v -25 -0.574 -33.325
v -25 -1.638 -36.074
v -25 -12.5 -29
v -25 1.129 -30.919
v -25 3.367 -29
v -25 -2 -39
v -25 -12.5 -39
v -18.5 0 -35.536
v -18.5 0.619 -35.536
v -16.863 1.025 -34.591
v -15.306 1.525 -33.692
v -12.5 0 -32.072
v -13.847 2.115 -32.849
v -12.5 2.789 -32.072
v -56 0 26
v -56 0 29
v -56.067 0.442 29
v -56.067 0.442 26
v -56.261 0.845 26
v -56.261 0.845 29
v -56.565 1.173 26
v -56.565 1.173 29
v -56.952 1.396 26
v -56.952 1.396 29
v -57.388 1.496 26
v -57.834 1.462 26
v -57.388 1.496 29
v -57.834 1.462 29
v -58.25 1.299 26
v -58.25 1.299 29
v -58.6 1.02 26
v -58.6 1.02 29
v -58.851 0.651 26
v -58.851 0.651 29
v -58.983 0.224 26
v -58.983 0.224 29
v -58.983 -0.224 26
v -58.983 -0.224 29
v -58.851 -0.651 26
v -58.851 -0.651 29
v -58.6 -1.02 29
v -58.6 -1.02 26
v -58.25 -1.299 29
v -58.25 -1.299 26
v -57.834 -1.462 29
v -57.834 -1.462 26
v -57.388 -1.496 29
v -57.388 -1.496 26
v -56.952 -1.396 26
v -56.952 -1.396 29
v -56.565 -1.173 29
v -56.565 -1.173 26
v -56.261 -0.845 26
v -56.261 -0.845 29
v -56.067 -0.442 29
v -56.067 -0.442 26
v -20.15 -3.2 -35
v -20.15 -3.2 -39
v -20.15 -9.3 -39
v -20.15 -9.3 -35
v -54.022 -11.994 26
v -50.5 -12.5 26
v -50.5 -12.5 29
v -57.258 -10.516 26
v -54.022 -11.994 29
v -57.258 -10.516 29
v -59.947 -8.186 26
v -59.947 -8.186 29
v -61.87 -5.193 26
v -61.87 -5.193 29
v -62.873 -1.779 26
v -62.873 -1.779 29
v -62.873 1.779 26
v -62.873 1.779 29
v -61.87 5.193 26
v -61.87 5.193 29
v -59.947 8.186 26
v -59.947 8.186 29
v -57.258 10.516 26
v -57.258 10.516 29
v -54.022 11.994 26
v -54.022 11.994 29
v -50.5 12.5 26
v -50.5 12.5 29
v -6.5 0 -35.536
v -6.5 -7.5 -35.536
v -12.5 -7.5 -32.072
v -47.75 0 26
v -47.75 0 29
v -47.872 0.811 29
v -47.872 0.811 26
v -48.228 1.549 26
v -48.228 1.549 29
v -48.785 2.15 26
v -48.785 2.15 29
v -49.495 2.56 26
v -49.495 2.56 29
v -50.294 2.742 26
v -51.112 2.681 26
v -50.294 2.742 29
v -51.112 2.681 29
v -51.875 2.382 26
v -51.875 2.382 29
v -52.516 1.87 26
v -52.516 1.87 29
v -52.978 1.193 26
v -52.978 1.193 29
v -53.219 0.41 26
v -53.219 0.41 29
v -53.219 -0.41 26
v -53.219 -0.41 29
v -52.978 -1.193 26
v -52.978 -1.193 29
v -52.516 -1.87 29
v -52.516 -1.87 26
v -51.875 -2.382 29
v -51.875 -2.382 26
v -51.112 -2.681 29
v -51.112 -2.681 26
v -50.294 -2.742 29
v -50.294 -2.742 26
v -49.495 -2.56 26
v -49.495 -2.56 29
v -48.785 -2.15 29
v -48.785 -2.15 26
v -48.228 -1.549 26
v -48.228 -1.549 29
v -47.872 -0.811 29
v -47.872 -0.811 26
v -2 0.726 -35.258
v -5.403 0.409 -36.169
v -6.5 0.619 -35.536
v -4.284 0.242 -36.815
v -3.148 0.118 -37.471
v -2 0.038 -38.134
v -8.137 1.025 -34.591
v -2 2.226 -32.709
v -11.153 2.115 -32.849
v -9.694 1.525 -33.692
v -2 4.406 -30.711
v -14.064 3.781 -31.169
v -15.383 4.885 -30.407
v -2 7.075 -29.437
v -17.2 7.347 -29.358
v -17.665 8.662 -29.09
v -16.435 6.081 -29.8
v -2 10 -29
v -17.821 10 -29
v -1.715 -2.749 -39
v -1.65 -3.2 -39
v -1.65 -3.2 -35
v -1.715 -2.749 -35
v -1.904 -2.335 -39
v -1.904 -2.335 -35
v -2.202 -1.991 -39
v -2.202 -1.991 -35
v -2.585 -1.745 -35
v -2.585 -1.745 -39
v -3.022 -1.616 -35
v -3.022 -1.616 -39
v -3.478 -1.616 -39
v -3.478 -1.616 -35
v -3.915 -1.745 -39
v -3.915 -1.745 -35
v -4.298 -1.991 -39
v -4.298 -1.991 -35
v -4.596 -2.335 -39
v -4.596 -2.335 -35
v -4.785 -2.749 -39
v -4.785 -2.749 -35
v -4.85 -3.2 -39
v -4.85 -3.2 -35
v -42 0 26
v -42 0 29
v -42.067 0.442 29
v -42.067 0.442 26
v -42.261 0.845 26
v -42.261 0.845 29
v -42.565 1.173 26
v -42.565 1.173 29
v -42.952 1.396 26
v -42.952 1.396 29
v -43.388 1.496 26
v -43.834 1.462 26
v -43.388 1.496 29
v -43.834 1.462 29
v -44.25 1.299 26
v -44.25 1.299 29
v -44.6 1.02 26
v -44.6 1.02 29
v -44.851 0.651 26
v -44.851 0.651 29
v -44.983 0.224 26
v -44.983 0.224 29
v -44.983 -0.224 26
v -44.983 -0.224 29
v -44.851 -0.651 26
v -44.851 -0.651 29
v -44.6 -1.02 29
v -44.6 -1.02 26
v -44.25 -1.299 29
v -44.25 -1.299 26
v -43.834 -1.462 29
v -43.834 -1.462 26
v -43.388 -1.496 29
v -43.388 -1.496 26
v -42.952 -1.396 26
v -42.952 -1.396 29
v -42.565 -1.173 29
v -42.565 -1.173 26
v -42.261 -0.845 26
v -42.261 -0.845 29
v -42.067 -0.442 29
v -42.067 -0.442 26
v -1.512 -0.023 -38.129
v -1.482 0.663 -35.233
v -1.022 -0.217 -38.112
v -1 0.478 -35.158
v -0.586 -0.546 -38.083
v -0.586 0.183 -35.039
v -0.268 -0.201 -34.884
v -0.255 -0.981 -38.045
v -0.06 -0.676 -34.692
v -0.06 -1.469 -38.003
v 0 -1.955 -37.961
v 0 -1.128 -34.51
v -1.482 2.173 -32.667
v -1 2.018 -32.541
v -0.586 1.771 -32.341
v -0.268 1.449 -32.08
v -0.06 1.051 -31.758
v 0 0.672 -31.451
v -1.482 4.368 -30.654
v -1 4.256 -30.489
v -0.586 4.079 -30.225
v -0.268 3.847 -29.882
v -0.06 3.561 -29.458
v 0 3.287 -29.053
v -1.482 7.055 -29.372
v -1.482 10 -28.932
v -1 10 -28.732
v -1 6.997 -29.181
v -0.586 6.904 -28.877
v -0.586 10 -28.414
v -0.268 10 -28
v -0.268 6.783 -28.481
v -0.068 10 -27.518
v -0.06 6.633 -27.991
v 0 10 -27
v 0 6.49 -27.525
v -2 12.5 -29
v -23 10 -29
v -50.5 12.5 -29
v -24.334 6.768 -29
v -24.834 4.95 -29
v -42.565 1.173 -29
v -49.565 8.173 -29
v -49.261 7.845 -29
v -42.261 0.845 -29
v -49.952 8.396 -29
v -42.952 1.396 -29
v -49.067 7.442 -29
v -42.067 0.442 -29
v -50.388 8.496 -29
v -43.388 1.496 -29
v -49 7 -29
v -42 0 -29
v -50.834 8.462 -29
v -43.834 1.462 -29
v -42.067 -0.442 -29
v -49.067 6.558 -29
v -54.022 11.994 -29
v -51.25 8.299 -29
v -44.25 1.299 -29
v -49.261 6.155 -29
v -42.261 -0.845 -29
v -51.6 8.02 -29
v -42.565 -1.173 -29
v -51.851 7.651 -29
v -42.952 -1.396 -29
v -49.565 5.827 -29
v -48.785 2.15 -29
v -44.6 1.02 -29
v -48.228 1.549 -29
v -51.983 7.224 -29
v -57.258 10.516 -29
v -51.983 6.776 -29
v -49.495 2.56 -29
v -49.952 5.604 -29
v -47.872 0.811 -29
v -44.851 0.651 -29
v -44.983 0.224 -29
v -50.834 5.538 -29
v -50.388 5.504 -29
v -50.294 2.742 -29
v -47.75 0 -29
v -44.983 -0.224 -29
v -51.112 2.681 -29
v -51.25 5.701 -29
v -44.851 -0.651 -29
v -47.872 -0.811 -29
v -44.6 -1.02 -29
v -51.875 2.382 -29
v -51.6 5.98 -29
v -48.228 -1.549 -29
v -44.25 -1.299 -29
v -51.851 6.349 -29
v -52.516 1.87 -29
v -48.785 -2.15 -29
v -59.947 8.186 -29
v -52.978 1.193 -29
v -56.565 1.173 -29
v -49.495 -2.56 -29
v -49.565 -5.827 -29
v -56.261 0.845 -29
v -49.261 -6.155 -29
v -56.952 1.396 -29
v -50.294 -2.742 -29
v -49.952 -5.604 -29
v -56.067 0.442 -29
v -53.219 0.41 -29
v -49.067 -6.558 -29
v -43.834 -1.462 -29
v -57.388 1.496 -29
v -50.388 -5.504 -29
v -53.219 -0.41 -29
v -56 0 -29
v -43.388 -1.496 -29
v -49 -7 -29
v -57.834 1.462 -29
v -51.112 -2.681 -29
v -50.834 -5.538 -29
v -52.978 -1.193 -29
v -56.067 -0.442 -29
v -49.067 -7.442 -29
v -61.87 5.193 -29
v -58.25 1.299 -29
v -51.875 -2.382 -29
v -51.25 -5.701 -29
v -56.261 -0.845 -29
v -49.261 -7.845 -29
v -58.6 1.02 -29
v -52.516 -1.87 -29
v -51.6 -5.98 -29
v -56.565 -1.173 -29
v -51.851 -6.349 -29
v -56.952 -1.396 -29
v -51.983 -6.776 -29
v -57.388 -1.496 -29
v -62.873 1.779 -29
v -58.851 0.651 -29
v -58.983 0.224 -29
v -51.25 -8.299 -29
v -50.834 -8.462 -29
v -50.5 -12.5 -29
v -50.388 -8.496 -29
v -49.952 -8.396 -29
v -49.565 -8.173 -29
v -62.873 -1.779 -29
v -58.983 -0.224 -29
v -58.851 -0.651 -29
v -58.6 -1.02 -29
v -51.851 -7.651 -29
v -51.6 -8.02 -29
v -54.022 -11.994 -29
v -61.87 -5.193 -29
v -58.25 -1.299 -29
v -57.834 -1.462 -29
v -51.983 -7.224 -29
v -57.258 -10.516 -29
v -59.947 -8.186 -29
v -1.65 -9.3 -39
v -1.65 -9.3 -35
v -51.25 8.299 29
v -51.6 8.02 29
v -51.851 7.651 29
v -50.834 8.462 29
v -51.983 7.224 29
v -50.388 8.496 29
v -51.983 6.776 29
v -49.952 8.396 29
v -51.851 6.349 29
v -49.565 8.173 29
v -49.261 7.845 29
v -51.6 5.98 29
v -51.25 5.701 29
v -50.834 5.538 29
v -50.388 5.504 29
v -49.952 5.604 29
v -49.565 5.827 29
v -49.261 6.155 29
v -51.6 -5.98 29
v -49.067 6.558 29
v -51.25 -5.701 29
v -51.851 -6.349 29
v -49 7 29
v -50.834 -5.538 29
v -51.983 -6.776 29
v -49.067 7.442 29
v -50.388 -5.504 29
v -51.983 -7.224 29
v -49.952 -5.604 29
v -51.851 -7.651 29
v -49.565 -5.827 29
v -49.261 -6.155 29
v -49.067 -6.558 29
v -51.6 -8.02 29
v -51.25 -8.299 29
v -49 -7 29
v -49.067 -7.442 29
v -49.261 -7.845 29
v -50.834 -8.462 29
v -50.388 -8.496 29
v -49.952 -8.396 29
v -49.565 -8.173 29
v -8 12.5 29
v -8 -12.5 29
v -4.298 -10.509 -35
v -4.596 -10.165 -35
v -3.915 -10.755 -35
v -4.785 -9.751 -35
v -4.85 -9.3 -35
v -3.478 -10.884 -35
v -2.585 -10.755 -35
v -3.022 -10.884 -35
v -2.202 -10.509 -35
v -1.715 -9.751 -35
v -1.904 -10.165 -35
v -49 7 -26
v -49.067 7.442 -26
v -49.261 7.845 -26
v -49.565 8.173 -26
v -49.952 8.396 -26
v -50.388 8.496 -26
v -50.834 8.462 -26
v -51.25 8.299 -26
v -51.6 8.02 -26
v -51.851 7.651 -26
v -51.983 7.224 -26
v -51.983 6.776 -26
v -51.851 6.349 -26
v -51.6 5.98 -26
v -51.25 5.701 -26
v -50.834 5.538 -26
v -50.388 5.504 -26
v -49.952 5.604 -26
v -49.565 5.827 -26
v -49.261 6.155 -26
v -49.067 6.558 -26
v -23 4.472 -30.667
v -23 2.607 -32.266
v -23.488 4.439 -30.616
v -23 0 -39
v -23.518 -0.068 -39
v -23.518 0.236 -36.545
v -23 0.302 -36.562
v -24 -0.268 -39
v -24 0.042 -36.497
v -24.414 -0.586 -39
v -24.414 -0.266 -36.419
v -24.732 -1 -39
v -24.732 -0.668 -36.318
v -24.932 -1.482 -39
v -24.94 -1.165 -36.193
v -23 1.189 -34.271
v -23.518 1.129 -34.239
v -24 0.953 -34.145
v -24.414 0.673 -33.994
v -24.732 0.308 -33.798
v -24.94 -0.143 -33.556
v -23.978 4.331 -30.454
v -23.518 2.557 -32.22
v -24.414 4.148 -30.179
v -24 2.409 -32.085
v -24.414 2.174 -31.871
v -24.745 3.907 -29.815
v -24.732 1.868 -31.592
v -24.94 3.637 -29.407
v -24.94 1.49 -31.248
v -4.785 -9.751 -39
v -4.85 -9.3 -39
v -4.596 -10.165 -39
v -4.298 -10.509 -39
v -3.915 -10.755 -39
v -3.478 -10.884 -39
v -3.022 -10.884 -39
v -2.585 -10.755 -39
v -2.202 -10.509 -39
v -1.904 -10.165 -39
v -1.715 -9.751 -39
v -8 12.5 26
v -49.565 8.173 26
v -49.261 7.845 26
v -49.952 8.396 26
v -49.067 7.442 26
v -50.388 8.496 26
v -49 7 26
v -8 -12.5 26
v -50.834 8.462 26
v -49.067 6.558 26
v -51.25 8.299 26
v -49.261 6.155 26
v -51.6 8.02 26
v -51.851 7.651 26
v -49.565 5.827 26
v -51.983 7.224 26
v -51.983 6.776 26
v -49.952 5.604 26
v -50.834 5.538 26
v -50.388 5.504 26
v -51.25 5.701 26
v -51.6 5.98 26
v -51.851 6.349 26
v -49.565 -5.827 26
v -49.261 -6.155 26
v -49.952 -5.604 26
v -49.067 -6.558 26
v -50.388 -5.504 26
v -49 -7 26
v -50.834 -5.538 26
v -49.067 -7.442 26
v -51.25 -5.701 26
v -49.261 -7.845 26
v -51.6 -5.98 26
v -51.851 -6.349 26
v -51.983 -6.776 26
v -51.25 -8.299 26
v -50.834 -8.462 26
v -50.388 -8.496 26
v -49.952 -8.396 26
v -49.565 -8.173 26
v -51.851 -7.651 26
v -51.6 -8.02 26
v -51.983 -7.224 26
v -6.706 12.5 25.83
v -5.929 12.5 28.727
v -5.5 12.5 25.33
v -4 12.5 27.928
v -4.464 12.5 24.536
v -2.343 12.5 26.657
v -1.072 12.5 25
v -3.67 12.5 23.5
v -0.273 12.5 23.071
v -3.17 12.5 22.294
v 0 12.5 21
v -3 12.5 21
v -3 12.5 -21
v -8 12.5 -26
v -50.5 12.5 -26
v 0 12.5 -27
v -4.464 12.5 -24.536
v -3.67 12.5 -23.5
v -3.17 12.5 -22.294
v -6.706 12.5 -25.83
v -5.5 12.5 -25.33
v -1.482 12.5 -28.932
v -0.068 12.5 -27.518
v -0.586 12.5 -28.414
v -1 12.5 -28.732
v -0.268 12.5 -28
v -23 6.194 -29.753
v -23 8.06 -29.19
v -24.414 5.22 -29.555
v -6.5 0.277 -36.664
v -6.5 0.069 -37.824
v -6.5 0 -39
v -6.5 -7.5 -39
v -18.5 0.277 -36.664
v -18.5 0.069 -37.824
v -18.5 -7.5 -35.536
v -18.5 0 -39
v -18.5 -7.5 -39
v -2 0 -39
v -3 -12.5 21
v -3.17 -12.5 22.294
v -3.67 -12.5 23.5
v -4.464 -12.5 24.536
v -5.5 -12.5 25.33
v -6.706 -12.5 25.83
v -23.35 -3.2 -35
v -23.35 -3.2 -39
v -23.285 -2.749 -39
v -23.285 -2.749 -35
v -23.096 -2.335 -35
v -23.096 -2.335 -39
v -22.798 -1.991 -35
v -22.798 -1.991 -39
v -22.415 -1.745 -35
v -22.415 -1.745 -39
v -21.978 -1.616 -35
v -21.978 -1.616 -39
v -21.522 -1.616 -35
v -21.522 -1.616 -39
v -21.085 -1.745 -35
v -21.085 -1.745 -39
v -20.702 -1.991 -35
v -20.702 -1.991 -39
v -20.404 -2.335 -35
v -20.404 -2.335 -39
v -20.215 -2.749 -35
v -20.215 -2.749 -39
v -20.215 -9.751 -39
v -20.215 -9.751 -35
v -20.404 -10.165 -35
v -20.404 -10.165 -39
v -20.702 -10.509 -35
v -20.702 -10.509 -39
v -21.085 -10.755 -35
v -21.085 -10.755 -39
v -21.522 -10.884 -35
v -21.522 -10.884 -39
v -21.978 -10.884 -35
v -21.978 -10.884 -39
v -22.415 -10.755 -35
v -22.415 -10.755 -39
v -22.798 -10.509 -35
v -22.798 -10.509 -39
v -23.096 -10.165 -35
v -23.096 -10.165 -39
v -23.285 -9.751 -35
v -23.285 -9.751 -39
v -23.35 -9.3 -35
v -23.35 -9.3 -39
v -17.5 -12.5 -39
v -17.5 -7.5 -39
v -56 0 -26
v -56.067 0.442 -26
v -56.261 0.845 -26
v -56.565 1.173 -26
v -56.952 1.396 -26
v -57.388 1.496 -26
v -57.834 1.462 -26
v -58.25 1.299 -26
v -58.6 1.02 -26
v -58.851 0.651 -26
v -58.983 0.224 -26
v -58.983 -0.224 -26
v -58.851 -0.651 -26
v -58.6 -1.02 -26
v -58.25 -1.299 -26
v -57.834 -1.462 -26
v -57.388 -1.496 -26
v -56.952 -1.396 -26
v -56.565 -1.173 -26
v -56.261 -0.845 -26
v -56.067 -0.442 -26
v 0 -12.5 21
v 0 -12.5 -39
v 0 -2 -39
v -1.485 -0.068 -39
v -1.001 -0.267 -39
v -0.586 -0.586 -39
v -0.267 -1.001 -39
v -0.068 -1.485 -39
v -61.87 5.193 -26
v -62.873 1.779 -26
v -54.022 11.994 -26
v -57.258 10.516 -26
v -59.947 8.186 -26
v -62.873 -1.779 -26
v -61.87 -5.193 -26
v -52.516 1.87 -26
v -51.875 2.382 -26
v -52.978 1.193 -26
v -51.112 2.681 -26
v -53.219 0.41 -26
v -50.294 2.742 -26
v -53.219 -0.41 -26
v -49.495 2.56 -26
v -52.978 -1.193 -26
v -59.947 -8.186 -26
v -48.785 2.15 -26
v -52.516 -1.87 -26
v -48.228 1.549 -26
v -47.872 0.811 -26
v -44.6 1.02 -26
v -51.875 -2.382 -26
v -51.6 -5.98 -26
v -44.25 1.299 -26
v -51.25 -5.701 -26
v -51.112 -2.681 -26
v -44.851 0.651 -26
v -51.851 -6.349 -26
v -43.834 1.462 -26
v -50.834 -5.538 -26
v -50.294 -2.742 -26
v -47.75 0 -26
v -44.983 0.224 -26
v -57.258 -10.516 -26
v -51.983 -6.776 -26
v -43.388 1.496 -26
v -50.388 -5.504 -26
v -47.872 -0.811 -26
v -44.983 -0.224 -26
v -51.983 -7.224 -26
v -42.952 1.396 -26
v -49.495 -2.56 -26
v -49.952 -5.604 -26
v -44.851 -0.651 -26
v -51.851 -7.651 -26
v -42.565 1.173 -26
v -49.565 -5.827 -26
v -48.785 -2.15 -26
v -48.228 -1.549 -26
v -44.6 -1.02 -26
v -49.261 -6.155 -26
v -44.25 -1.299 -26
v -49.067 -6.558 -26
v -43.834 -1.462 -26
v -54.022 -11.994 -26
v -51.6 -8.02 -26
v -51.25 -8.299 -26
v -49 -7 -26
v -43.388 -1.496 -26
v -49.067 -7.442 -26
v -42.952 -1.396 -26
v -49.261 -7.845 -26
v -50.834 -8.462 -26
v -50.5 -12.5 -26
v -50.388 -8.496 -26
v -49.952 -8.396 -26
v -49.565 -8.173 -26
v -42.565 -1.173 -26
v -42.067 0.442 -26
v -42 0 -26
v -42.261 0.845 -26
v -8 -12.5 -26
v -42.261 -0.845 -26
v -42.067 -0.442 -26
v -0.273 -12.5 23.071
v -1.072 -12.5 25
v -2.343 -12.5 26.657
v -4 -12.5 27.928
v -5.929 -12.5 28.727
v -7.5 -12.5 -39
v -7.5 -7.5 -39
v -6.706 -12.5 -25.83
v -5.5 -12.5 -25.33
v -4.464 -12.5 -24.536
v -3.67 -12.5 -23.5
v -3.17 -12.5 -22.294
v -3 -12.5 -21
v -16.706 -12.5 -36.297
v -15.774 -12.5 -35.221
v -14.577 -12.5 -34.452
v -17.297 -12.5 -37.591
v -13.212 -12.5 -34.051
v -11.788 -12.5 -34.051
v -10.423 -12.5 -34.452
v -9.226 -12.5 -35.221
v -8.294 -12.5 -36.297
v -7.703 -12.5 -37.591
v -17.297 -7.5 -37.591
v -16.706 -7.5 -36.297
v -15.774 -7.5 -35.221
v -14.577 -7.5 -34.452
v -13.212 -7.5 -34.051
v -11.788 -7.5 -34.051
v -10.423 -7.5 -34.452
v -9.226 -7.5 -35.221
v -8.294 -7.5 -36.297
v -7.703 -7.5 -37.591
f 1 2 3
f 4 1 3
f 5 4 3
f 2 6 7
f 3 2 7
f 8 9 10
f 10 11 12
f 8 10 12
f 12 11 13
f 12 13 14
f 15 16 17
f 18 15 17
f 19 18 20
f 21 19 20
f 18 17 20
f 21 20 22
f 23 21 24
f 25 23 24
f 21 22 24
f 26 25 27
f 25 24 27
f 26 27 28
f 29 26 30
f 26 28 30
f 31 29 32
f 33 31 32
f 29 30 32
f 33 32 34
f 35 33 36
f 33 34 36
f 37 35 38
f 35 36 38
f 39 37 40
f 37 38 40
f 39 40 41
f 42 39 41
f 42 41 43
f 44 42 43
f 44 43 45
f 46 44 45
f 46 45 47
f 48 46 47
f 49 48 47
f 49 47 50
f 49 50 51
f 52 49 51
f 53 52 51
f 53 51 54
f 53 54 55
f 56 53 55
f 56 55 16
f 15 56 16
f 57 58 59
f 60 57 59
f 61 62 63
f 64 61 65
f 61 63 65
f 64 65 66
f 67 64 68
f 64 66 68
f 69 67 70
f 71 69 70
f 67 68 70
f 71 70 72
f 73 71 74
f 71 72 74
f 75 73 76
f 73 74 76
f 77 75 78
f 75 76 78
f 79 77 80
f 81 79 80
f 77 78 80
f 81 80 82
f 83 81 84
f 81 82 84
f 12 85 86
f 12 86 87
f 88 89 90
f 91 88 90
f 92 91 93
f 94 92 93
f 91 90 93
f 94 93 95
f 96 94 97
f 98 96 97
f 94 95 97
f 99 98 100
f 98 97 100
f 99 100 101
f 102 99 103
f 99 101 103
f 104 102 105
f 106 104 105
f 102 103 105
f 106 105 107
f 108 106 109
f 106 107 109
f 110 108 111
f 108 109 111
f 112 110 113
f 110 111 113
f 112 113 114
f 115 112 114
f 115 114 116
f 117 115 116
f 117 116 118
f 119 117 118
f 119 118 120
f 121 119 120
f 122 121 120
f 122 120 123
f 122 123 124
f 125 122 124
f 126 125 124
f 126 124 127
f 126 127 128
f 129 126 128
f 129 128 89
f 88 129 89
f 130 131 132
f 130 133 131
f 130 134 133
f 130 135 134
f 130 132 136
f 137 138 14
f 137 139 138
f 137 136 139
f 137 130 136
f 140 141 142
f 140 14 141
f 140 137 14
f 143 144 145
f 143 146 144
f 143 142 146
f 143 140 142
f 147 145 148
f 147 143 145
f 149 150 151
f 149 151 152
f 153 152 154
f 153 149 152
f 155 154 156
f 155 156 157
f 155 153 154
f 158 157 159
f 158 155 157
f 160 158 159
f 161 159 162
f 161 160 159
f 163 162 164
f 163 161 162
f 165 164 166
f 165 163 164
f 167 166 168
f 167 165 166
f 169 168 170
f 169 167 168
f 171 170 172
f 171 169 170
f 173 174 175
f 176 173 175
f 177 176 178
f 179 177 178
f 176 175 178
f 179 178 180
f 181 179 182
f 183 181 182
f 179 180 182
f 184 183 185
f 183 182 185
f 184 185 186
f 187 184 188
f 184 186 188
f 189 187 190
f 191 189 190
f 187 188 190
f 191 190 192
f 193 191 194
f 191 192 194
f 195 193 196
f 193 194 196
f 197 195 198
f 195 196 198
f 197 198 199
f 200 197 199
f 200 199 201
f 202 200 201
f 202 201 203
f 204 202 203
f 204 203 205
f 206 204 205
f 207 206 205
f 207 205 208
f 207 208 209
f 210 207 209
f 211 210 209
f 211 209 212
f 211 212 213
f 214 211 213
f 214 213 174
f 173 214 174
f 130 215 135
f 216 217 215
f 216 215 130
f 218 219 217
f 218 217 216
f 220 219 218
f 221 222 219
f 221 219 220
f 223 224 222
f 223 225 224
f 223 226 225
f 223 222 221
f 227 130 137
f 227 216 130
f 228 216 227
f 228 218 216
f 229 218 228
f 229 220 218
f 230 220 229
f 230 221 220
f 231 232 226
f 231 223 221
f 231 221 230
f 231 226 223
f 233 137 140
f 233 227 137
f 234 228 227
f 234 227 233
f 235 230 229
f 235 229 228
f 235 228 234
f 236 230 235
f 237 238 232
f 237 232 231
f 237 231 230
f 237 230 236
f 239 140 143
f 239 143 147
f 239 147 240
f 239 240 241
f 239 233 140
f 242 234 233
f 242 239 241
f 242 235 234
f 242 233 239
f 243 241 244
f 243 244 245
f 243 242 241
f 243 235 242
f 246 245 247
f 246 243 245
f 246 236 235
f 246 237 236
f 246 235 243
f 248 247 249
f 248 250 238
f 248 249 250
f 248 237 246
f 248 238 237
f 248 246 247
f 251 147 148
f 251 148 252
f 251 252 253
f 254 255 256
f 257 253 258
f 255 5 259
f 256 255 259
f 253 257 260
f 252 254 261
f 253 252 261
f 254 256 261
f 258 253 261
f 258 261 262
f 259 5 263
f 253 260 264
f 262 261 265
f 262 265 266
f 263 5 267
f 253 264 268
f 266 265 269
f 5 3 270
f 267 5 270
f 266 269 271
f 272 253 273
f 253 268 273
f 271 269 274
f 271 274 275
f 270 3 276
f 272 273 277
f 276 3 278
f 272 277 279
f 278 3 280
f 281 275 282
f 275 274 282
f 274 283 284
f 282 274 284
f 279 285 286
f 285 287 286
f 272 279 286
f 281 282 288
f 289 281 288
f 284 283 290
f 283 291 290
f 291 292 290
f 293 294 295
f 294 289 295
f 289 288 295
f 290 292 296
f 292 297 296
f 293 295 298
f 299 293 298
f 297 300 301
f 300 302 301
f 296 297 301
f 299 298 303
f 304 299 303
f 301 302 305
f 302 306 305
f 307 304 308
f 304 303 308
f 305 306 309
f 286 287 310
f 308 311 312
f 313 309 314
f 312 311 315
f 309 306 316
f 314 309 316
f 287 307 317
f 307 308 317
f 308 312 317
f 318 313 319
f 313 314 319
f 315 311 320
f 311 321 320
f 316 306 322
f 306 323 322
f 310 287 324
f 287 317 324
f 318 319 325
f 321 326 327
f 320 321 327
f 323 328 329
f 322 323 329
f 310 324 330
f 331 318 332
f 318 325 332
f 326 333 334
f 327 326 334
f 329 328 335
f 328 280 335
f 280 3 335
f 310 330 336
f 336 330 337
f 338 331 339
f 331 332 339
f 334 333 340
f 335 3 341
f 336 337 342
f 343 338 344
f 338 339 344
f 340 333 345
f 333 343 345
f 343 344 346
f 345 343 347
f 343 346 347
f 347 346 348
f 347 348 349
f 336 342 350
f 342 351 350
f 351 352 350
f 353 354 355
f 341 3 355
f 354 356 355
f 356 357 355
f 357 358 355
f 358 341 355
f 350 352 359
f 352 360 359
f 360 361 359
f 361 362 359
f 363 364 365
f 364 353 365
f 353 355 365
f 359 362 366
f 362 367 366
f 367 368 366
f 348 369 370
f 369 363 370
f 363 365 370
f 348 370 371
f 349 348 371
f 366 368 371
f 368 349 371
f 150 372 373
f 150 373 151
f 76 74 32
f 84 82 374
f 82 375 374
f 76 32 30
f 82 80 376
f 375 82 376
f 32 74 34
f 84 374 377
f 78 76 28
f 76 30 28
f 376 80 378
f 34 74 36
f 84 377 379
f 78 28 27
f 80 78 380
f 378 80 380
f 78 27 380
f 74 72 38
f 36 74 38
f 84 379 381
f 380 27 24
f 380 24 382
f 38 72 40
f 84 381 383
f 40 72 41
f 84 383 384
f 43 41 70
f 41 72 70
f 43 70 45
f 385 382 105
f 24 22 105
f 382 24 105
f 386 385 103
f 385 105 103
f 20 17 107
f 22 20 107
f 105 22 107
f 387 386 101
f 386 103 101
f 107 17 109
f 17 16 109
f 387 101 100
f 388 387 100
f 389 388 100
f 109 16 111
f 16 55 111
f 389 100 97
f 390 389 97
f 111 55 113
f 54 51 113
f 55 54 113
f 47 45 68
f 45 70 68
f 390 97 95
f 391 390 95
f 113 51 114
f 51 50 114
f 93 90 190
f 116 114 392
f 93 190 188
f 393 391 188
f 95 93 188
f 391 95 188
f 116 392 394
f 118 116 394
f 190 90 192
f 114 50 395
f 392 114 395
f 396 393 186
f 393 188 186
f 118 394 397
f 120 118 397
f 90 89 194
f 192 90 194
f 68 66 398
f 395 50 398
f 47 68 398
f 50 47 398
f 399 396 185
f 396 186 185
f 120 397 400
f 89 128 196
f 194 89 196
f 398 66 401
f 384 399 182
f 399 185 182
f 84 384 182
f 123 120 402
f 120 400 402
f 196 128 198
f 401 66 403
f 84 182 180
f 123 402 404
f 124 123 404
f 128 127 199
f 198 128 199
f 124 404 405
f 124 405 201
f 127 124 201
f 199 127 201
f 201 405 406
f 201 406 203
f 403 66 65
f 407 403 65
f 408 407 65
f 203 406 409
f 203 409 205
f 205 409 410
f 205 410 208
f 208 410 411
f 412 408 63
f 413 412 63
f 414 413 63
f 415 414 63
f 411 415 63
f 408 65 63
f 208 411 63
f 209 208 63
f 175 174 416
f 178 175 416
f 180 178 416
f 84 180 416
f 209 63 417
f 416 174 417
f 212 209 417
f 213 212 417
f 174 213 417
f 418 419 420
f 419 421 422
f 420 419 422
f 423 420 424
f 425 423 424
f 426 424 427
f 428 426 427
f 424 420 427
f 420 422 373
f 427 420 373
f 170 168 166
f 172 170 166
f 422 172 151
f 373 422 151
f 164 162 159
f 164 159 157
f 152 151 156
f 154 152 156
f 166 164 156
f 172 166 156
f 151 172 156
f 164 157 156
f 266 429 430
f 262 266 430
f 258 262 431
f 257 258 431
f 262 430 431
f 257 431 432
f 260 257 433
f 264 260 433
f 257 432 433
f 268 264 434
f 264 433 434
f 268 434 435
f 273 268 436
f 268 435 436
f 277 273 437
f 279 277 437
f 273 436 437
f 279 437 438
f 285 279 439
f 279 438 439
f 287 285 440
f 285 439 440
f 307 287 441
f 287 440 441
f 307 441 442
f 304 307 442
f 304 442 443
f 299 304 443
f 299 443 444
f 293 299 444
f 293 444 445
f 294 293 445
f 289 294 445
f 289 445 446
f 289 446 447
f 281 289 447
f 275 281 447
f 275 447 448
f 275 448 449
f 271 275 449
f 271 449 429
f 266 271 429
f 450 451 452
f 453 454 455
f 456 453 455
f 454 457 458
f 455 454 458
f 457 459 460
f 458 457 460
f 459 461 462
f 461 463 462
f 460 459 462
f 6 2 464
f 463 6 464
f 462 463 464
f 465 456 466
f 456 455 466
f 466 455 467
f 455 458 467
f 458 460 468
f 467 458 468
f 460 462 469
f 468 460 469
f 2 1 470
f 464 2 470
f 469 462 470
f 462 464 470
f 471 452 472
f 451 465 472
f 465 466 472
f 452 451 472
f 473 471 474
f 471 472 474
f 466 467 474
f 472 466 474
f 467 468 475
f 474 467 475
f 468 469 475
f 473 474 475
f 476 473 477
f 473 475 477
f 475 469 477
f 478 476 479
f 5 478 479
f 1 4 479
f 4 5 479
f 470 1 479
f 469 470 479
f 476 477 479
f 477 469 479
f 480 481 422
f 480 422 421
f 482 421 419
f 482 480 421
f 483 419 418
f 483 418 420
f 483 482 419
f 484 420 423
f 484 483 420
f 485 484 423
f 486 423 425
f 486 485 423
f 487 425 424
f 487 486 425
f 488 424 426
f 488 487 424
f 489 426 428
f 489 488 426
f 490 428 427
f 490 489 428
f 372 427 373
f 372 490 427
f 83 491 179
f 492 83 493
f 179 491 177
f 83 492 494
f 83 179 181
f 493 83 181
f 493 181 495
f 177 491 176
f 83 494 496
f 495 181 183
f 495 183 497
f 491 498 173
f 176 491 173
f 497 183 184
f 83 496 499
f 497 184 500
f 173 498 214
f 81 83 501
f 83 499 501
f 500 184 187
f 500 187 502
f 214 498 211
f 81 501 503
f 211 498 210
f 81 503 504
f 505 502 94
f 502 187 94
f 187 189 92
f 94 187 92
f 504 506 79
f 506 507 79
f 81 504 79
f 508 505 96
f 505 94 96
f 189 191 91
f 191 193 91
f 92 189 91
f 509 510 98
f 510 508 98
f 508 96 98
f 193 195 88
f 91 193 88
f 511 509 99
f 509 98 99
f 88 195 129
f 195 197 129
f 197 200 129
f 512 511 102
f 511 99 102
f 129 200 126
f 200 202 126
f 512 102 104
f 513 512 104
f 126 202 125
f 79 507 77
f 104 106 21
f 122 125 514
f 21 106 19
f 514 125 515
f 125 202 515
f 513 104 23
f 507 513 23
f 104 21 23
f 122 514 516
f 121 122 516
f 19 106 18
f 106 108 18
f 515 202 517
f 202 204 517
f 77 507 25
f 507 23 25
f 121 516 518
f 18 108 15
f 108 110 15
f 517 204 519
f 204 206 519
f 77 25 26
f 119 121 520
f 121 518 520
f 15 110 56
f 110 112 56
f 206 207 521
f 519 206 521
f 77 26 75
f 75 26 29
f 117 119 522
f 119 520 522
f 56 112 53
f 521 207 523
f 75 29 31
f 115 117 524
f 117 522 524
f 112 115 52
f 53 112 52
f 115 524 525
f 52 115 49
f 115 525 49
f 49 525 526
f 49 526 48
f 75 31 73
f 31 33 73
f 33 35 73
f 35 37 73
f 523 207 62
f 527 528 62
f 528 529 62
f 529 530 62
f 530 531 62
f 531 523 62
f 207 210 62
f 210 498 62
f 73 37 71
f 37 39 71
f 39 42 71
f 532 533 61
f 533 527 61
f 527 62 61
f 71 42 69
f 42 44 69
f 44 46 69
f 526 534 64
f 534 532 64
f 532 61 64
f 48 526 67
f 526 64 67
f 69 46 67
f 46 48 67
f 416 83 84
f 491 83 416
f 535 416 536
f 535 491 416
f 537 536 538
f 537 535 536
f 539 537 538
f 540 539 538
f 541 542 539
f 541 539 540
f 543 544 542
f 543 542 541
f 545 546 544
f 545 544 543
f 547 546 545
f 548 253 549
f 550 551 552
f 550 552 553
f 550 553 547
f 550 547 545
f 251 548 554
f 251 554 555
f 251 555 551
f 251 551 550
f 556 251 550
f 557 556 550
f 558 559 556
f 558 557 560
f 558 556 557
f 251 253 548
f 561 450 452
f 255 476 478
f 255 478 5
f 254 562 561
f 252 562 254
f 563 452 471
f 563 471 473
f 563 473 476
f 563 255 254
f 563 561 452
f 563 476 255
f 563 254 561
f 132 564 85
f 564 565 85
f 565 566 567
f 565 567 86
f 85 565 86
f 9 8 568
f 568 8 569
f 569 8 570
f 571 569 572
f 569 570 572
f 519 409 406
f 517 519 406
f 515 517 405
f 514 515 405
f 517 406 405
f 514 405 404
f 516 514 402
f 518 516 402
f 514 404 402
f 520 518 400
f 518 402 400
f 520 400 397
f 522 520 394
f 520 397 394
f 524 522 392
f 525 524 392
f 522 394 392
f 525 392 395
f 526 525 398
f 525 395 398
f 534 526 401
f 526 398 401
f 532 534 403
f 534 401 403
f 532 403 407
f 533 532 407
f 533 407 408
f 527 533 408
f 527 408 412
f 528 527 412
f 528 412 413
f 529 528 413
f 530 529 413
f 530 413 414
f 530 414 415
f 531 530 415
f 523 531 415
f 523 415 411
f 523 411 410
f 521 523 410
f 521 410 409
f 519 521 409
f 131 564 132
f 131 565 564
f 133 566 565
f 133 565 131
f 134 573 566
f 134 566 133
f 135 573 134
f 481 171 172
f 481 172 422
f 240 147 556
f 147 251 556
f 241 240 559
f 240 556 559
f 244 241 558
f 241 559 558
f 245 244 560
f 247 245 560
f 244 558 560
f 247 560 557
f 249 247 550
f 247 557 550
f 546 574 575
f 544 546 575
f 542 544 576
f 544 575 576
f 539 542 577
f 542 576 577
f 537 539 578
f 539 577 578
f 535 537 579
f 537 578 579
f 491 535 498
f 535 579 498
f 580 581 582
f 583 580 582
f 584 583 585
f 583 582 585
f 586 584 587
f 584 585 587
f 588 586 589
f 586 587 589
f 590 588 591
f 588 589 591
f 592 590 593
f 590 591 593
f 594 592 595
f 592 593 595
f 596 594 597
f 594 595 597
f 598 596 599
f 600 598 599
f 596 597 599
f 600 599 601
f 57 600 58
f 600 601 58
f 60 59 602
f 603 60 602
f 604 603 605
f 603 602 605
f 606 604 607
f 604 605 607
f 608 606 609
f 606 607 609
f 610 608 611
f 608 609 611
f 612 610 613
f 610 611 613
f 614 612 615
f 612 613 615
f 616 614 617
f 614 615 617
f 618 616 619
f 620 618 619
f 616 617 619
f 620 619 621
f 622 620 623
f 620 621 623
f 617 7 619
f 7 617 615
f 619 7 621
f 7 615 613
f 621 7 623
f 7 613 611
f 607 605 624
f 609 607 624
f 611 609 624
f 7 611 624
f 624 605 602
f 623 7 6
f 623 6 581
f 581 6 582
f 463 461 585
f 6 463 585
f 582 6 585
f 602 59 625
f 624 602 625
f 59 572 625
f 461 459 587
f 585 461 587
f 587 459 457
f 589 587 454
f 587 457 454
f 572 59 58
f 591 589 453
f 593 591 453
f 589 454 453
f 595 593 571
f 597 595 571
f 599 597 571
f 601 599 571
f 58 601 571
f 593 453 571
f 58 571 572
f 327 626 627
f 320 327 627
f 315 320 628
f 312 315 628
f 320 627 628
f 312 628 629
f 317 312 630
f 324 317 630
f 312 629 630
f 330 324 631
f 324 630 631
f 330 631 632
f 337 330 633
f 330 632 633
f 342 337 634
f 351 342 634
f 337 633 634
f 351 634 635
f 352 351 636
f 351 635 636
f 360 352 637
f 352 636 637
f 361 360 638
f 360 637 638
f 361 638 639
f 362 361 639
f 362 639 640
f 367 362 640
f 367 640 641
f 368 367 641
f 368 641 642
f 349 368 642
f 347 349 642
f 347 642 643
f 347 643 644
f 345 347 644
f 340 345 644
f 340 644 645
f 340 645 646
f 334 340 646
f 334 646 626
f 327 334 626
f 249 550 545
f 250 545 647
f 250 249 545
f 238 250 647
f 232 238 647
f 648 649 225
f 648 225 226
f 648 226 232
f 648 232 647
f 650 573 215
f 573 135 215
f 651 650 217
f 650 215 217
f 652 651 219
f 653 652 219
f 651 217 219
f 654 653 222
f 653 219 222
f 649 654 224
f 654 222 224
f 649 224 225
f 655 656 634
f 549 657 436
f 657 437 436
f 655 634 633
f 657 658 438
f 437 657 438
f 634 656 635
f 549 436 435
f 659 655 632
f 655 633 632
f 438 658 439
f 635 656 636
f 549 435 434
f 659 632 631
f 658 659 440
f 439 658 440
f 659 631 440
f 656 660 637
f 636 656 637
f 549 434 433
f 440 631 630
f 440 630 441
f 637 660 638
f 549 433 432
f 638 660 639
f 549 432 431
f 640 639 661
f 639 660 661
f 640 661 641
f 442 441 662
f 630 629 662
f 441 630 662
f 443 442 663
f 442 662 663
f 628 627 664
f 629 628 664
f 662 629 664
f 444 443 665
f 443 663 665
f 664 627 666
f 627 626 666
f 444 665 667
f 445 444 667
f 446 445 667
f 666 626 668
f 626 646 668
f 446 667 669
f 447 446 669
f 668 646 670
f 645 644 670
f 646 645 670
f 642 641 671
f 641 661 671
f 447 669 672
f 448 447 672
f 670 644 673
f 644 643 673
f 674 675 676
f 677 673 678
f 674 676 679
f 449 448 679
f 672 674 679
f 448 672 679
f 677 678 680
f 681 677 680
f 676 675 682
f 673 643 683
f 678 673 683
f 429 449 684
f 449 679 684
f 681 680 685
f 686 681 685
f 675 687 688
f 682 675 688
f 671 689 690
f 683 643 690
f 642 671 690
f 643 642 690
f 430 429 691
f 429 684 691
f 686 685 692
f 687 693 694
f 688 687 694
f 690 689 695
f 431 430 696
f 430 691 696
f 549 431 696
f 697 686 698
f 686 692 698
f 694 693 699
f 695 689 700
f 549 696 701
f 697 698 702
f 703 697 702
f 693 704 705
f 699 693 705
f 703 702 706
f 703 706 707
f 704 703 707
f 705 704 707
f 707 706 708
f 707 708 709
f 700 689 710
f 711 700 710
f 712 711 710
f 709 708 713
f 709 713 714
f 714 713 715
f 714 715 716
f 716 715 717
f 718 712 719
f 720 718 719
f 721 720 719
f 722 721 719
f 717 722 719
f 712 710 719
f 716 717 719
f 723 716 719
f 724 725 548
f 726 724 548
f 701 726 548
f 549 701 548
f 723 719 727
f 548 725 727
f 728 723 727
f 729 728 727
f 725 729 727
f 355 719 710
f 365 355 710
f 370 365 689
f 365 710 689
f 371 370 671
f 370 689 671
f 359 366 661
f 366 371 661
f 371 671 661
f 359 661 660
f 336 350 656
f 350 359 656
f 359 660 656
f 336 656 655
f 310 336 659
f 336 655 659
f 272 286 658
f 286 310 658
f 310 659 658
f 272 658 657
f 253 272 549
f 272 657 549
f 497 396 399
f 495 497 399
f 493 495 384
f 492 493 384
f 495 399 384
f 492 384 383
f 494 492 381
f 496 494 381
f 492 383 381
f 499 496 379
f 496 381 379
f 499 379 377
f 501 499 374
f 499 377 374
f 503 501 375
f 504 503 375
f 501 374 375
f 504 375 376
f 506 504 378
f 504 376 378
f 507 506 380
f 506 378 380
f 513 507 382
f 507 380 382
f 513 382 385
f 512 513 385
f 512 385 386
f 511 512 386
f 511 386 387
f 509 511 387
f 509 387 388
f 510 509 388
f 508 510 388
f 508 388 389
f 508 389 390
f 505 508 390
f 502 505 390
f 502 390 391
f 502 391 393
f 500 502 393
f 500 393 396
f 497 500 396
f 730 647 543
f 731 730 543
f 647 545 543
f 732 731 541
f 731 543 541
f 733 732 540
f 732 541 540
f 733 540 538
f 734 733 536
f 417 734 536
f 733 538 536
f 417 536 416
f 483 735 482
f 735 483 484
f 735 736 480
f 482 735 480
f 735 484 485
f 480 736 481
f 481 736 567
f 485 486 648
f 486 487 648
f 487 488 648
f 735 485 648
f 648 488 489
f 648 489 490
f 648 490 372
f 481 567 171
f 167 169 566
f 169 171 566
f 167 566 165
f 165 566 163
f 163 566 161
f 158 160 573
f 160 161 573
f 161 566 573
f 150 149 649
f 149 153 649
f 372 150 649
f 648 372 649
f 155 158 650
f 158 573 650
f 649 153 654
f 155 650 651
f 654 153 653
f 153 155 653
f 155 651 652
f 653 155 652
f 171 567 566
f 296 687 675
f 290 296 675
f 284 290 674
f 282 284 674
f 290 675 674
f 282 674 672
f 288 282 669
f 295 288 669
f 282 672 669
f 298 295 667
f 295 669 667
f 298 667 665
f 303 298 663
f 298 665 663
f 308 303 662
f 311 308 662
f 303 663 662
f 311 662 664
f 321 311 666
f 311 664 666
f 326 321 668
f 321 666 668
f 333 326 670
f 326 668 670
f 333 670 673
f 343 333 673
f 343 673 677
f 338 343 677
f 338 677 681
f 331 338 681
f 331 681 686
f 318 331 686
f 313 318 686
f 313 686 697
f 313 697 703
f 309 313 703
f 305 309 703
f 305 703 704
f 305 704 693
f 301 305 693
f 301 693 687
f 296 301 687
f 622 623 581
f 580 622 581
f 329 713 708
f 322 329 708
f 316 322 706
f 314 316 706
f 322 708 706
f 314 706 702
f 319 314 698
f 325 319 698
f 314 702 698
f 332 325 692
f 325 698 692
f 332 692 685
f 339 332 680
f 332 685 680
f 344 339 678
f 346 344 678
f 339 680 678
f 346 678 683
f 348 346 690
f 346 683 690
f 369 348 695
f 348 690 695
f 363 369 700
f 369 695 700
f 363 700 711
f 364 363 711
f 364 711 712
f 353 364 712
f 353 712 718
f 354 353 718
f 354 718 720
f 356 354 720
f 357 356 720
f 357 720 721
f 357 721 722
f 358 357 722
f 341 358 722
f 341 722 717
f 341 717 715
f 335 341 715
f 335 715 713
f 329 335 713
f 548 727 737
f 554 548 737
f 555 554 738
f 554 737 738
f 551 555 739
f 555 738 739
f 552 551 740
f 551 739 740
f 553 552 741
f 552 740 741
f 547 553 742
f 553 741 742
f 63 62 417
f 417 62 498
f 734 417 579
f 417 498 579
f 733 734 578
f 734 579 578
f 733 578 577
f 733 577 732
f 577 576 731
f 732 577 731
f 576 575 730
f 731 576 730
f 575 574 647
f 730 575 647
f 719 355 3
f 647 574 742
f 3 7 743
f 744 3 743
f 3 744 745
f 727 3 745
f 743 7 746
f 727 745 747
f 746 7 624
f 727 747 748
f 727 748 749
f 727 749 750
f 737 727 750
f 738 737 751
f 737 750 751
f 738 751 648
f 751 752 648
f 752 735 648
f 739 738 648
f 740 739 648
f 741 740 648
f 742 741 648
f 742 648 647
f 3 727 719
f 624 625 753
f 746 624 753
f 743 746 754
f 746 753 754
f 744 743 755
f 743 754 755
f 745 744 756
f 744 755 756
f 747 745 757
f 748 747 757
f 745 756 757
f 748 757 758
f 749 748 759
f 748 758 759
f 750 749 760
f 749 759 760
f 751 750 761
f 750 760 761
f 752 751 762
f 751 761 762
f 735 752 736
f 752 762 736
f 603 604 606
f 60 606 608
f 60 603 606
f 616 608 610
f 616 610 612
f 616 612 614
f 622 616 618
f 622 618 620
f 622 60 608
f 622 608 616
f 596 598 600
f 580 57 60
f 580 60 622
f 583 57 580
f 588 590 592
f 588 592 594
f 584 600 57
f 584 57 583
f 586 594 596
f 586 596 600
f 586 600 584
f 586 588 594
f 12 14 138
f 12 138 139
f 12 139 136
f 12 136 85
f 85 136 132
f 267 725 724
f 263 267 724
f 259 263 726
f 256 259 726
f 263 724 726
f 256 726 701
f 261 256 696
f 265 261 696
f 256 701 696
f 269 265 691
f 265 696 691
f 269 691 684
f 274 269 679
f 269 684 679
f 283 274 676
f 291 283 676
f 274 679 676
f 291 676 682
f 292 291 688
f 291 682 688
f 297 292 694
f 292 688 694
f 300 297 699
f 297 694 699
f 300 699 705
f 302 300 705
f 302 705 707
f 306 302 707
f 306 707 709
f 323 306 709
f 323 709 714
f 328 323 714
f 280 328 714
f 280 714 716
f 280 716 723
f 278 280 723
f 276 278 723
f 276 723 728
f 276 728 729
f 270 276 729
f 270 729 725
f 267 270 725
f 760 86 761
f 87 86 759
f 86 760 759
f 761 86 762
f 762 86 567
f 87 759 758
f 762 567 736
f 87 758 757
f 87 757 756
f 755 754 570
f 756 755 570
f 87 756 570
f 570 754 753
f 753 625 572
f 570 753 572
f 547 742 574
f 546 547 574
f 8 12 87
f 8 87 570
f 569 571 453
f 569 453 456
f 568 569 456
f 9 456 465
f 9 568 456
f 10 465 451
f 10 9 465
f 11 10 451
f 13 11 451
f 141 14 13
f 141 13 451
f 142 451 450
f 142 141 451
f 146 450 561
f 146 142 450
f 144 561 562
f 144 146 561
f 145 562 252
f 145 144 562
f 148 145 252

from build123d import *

# Parameters (mm, degrees)
BOSS_EXTRU_1_DEPTH      = 12.5
BOSS_EXTRU_1_DEPTH_BACK = 12.5
ESQUISSE2_R             = 2.75
ESQUISSE2_R_2           = 1.5
ENL_V_MAT_EXTRU_2_DEPTH = 87.540452969
ESQUISSE3_W             = 25
ESQUISSE3_H             = 10
BOSS_EXTRU_2_DEPTH      = 12.5
ENL_V_MAT_EXTRU_3_DEPTH = 7.5
CONG_1_R                = 8
ESQUISSE5_R             = 5
ENL_V_MAT_EXTRU_4_DEPTH = 77.746335417
ENL_V_MAT_EXTRU_5_DEPTH = 4
CONG_2_R                = 10
CONG_3_R                = 2


with BuildPart() as part:
    # Esquisse1 → Boss.-Extru.1 (new, two sides: drawn at the far end of the back side and taken through both)
    with BuildSketch(Plane(origin=(0, 0, 0), x_dir=(1, 0, 0), z_dir=(0, 1, 0)).offset(-BOSS_EXTRU_1_DEPTH_BACK)):
        with BuildLine():
            Line((-3, 21), (-3, -21))
            ThreePointArc((-3, -21), (-4.464466094, -24.535533906), (-8, -26))
            Line((-8, -26), (-63, -26))
            Line((-63, -26), (-63, -29))
            Line((-63, -29), (-3, -29))
            Line((-3, -29), (0, -29))
            Line((0, -29), (0, 29))
            Line((0, 29), (-3, 29))
            Line((-3, 29), (-63, 29))
            Line((-63, 29), (-63, 26))
            Line((-63, 26), (-8, 26))
            ThreePointArc((-8, 26), (-4.464466094, 24.535533906), (-3, 21))
        make_face()
    extrude(amount=BOSS_EXTRU_1_DEPTH + BOSS_EXTRU_1_DEPTH_BACK)

    # Esquisse2 → Enlèv. mat.-Extru.2 (cut, through all)
    with BuildSketch(Plane.XY.offset(29)):
        with Locations((-50.5, 0)):
            Circle(ESQUISSE2_R)
        with Locations((-57.5, 0)):
            Circle(ESQUISSE2_R_2)
        with Locations((-50.5, 7)):
            Circle(ESQUISSE2_R_2)
        with Locations((-43.5, 0)):
            Circle(ESQUISSE2_R_2)
        with Locations((-50.5, -7)):
            Circle(ESQUISSE2_R_2)
        with BuildLine():
            Line((-50.5, 12.5), (-68.703776387, 33.647767052))
            Line((-68.703776387, 33.647767052), (-74.904354154, -25.066543002))
            Line((-74.904354154, -25.066543002), (-54.406878728, -18.845916132))
            Line((-54.406878728, -18.845916132), (-50.5, -12.5))
            ThreePointArc((-50.5, -12.5), (-63, 0), (-50.5, 12.5))
        make_face()
    extrude(amount=-ENL_V_MAT_EXTRU_2_DEPTH, mode=Mode.SUBTRACT)

    # Esquisse3 → Boss.-Extru.2 (add)
    with BuildSketch(Plane(origin=(0, 0, 0), x_dir=(1, 0, 0), z_dir=(0, 1, 0))):
        with Locations((-12.5, 34)):
            Rectangle(ESQUISSE3_W, ESQUISSE3_H)
    extrude(amount=-BOSS_EXTRU_2_DEPTH)

    # Esquisse4 → Enlèv. mat.-Extru.3 (cut)
    with BuildSketch(Plane(origin=(0, 0, 0), x_dir=(1, 0, 0), z_dir=(0, 1, 0))):
        Polygon((-18.5, 39), (-6.5, 44), (-6.5, 35.535898385), (-12.5, 32.07179677), (-18.5, 35.535898385), align=None)
    extrude(amount=-ENL_V_MAT_EXTRU_3_DEPTH, mode=Mode.SUBTRACT)

    # Congé1
    cong_1_edges = [part.edges().sort_by_distance(p)[0] for p in [
        (0, 0, 29),
    ]]
    fillet(cong_1_edges, radius=CONG_1_R)

    # Esquisse5 → Enlèv. mat.-Extru.4 (cut, through all)
    with BuildSketch(Plane(origin=(0, -7.5, 0), x_dir=(1, 0, 0), z_dir=(0, 1, 0))):
        with Locations((-12.5, 39)):
            Circle(ESQUISSE5_R)
    extrude(amount=-ENL_V_MAT_EXTRU_4_DEPTH, mode=Mode.SUBTRACT)

    # Esquisse6 → Enlèv. mat.-Extru.5 (cut)
    with BuildSketch(Plane(origin=(0, 0, -39), x_dir=(-1, 0, 0), z_dir=(0, 0, -1))):
        with BuildLine():
            Line((4.85, -3.2), (4.85, -9.3))
            ThreePointArc((4.85, -9.3), (3.25, -10.9), (1.65, -9.3))
            Line((1.65, -9.3), (1.65, -3.2))
            ThreePointArc((1.65, -3.2), (3.25, -1.6), (4.85, -3.2))
        make_face()
        with BuildLine():
            Line((20.15, -3.2), (20.15, -9.3))
            ThreePointArc((20.15, -9.3), (21.75, -10.9), (23.35, -9.3))
            Line((23.35, -9.3), (23.35, -3.2))
            ThreePointArc((23.35, -3.2), (21.75, -1.6), (20.15, -3.2))
        make_face()
    extrude(amount=-ENL_V_MAT_EXTRU_5_DEPTH, mode=Mode.SUBTRACT)

    # Congé2
    # the kernel refuses this fillet: 10 mm, written as the material it adds along each edge
    with BuildSketch(Plane(origin=(0, 0, -29), x_dir=(0, 1, 0), z_dir=(-1, 0, 0))) as cong_2_piece_1_section:
        with BuildLine():
            CenterArc((CONG_2_R, CONG_2_R), CONG_2_R, 180, 90)
            Line((0, CONG_2_R), (0, 0))
            Line((0, 0), (CONG_2_R, 0))
        make_face()
    cong_2_piece_1 = extrude(amount=50, mode=Mode.PRIVATE)
    cong_2_piece_1 = split(cong_2_piece_1, bisect_by=Plane(origin=(-5.932407877, 2.249723915, -35.86359785), z_dir=(0.5000000000000038, 0, 0.8660254037844365)), keep=Keep.TOP, mode=Mode.PRIVATE)
    add(cong_2_piece_1)
    with BuildSketch(Plane(origin=(25, 0, -29), x_dir=(0, 1, 0), z_dir=(-1, 0, 0))) as cong_2_piece_2_section:
        with BuildLine():
            CenterArc((CONG_2_R, CONG_2_R), CONG_2_R, 180, 90)
            Line((0, CONG_2_R), (0, 0))
            Line((0, 0), (CONG_2_R, 0))
        make_face()
    cong_2_piece_2 = extrude(amount=75, mode=Mode.PRIVATE)
    cong_2_piece_2 = split(cong_2_piece_2, bisect_by=Plane(origin=(-6.5, 0.122528236, -36.916597474), z_dir=(1, 0, 0)), keep=Keep.TOP, mode=Mode.PRIVATE)
    cong_2_piece_2 = split(cong_2_piece_2, bisect_by=Plane(origin=(-5.005349392, 0.122528236, -36.398835316), z_dir=(-0.5000000000000038, 0, -0.8660254037844365)), keep=Keep.TOP, mode=Mode.PRIVATE)
    add(cong_2_piece_2)
    with BuildSketch(Plane(origin=(25, 0, -29), x_dir=(0, 1, 0), z_dir=(-1, 0, 0))) as cong_2_piece_3_section:
        with BuildLine():
            CenterArc((CONG_2_R, CONG_2_R), CONG_2_R, 180, 90)
            Line((0, CONG_2_R), (0, 0))
            Line((0, 0), (CONG_2_R, 0))
        make_face()
    cong_2_piece_3 = extrude(amount=50, mode=Mode.PRIVATE)
    cong_2_piece_3 = split(cong_2_piece_3, bisect_by=Plane(origin=(-18.5, 0.122528236, -36.916597474), z_dir=(-1, 0, 0)), keep=Keep.TOP, mode=Mode.PRIVATE)
    add(cong_2_piece_3)
    with BuildSketch(Plane(origin=(25, 0, -29), x_dir=(0, 1, 0), z_dir=(-1, 0, 0))) as cong_2_piece_4_section:
        with BuildLine():
            CenterArc((CONG_2_R, CONG_2_R), CONG_2_R, 180, 90)
            Line((0, CONG_2_R), (0, 0))
            Line((0, 0), (CONG_2_R, 0))
        make_face()
    cong_2_piece_4 = extrude(amount=75, mode=Mode.PRIVATE)
    cong_2_piece_4 = split(cong_2_piece_4, bisect_by=Plane(origin=(-15.261211998, 1.931548804, -33.66598326), z_dir=(-0.4999999999999996, 0, 0.8660254037844389)), keep=Keep.TOP, mode=Mode.PRIVATE)
    cong_2_piece_4 = split(cong_2_piece_4, bisect_by=Plane(origin=(-18.5, 1.931548804, -31.415325701), z_dir=(1, 0, 0)), keep=Keep.TOP, mode=Mode.PRIVATE)
    add(cong_2_piece_4)

    # Congé3
    cong_3_edges = [part.edges().sort_by_distance(p)[0] for p in [
        (-25, 2.928932188, -31.928932188),
        (0, 2.928932188, -31.928932188),
        (0, 11.25, -29),
    ]]
    fillet(cong_3_edges, radius=CONG_3_R)


solid = part.part
